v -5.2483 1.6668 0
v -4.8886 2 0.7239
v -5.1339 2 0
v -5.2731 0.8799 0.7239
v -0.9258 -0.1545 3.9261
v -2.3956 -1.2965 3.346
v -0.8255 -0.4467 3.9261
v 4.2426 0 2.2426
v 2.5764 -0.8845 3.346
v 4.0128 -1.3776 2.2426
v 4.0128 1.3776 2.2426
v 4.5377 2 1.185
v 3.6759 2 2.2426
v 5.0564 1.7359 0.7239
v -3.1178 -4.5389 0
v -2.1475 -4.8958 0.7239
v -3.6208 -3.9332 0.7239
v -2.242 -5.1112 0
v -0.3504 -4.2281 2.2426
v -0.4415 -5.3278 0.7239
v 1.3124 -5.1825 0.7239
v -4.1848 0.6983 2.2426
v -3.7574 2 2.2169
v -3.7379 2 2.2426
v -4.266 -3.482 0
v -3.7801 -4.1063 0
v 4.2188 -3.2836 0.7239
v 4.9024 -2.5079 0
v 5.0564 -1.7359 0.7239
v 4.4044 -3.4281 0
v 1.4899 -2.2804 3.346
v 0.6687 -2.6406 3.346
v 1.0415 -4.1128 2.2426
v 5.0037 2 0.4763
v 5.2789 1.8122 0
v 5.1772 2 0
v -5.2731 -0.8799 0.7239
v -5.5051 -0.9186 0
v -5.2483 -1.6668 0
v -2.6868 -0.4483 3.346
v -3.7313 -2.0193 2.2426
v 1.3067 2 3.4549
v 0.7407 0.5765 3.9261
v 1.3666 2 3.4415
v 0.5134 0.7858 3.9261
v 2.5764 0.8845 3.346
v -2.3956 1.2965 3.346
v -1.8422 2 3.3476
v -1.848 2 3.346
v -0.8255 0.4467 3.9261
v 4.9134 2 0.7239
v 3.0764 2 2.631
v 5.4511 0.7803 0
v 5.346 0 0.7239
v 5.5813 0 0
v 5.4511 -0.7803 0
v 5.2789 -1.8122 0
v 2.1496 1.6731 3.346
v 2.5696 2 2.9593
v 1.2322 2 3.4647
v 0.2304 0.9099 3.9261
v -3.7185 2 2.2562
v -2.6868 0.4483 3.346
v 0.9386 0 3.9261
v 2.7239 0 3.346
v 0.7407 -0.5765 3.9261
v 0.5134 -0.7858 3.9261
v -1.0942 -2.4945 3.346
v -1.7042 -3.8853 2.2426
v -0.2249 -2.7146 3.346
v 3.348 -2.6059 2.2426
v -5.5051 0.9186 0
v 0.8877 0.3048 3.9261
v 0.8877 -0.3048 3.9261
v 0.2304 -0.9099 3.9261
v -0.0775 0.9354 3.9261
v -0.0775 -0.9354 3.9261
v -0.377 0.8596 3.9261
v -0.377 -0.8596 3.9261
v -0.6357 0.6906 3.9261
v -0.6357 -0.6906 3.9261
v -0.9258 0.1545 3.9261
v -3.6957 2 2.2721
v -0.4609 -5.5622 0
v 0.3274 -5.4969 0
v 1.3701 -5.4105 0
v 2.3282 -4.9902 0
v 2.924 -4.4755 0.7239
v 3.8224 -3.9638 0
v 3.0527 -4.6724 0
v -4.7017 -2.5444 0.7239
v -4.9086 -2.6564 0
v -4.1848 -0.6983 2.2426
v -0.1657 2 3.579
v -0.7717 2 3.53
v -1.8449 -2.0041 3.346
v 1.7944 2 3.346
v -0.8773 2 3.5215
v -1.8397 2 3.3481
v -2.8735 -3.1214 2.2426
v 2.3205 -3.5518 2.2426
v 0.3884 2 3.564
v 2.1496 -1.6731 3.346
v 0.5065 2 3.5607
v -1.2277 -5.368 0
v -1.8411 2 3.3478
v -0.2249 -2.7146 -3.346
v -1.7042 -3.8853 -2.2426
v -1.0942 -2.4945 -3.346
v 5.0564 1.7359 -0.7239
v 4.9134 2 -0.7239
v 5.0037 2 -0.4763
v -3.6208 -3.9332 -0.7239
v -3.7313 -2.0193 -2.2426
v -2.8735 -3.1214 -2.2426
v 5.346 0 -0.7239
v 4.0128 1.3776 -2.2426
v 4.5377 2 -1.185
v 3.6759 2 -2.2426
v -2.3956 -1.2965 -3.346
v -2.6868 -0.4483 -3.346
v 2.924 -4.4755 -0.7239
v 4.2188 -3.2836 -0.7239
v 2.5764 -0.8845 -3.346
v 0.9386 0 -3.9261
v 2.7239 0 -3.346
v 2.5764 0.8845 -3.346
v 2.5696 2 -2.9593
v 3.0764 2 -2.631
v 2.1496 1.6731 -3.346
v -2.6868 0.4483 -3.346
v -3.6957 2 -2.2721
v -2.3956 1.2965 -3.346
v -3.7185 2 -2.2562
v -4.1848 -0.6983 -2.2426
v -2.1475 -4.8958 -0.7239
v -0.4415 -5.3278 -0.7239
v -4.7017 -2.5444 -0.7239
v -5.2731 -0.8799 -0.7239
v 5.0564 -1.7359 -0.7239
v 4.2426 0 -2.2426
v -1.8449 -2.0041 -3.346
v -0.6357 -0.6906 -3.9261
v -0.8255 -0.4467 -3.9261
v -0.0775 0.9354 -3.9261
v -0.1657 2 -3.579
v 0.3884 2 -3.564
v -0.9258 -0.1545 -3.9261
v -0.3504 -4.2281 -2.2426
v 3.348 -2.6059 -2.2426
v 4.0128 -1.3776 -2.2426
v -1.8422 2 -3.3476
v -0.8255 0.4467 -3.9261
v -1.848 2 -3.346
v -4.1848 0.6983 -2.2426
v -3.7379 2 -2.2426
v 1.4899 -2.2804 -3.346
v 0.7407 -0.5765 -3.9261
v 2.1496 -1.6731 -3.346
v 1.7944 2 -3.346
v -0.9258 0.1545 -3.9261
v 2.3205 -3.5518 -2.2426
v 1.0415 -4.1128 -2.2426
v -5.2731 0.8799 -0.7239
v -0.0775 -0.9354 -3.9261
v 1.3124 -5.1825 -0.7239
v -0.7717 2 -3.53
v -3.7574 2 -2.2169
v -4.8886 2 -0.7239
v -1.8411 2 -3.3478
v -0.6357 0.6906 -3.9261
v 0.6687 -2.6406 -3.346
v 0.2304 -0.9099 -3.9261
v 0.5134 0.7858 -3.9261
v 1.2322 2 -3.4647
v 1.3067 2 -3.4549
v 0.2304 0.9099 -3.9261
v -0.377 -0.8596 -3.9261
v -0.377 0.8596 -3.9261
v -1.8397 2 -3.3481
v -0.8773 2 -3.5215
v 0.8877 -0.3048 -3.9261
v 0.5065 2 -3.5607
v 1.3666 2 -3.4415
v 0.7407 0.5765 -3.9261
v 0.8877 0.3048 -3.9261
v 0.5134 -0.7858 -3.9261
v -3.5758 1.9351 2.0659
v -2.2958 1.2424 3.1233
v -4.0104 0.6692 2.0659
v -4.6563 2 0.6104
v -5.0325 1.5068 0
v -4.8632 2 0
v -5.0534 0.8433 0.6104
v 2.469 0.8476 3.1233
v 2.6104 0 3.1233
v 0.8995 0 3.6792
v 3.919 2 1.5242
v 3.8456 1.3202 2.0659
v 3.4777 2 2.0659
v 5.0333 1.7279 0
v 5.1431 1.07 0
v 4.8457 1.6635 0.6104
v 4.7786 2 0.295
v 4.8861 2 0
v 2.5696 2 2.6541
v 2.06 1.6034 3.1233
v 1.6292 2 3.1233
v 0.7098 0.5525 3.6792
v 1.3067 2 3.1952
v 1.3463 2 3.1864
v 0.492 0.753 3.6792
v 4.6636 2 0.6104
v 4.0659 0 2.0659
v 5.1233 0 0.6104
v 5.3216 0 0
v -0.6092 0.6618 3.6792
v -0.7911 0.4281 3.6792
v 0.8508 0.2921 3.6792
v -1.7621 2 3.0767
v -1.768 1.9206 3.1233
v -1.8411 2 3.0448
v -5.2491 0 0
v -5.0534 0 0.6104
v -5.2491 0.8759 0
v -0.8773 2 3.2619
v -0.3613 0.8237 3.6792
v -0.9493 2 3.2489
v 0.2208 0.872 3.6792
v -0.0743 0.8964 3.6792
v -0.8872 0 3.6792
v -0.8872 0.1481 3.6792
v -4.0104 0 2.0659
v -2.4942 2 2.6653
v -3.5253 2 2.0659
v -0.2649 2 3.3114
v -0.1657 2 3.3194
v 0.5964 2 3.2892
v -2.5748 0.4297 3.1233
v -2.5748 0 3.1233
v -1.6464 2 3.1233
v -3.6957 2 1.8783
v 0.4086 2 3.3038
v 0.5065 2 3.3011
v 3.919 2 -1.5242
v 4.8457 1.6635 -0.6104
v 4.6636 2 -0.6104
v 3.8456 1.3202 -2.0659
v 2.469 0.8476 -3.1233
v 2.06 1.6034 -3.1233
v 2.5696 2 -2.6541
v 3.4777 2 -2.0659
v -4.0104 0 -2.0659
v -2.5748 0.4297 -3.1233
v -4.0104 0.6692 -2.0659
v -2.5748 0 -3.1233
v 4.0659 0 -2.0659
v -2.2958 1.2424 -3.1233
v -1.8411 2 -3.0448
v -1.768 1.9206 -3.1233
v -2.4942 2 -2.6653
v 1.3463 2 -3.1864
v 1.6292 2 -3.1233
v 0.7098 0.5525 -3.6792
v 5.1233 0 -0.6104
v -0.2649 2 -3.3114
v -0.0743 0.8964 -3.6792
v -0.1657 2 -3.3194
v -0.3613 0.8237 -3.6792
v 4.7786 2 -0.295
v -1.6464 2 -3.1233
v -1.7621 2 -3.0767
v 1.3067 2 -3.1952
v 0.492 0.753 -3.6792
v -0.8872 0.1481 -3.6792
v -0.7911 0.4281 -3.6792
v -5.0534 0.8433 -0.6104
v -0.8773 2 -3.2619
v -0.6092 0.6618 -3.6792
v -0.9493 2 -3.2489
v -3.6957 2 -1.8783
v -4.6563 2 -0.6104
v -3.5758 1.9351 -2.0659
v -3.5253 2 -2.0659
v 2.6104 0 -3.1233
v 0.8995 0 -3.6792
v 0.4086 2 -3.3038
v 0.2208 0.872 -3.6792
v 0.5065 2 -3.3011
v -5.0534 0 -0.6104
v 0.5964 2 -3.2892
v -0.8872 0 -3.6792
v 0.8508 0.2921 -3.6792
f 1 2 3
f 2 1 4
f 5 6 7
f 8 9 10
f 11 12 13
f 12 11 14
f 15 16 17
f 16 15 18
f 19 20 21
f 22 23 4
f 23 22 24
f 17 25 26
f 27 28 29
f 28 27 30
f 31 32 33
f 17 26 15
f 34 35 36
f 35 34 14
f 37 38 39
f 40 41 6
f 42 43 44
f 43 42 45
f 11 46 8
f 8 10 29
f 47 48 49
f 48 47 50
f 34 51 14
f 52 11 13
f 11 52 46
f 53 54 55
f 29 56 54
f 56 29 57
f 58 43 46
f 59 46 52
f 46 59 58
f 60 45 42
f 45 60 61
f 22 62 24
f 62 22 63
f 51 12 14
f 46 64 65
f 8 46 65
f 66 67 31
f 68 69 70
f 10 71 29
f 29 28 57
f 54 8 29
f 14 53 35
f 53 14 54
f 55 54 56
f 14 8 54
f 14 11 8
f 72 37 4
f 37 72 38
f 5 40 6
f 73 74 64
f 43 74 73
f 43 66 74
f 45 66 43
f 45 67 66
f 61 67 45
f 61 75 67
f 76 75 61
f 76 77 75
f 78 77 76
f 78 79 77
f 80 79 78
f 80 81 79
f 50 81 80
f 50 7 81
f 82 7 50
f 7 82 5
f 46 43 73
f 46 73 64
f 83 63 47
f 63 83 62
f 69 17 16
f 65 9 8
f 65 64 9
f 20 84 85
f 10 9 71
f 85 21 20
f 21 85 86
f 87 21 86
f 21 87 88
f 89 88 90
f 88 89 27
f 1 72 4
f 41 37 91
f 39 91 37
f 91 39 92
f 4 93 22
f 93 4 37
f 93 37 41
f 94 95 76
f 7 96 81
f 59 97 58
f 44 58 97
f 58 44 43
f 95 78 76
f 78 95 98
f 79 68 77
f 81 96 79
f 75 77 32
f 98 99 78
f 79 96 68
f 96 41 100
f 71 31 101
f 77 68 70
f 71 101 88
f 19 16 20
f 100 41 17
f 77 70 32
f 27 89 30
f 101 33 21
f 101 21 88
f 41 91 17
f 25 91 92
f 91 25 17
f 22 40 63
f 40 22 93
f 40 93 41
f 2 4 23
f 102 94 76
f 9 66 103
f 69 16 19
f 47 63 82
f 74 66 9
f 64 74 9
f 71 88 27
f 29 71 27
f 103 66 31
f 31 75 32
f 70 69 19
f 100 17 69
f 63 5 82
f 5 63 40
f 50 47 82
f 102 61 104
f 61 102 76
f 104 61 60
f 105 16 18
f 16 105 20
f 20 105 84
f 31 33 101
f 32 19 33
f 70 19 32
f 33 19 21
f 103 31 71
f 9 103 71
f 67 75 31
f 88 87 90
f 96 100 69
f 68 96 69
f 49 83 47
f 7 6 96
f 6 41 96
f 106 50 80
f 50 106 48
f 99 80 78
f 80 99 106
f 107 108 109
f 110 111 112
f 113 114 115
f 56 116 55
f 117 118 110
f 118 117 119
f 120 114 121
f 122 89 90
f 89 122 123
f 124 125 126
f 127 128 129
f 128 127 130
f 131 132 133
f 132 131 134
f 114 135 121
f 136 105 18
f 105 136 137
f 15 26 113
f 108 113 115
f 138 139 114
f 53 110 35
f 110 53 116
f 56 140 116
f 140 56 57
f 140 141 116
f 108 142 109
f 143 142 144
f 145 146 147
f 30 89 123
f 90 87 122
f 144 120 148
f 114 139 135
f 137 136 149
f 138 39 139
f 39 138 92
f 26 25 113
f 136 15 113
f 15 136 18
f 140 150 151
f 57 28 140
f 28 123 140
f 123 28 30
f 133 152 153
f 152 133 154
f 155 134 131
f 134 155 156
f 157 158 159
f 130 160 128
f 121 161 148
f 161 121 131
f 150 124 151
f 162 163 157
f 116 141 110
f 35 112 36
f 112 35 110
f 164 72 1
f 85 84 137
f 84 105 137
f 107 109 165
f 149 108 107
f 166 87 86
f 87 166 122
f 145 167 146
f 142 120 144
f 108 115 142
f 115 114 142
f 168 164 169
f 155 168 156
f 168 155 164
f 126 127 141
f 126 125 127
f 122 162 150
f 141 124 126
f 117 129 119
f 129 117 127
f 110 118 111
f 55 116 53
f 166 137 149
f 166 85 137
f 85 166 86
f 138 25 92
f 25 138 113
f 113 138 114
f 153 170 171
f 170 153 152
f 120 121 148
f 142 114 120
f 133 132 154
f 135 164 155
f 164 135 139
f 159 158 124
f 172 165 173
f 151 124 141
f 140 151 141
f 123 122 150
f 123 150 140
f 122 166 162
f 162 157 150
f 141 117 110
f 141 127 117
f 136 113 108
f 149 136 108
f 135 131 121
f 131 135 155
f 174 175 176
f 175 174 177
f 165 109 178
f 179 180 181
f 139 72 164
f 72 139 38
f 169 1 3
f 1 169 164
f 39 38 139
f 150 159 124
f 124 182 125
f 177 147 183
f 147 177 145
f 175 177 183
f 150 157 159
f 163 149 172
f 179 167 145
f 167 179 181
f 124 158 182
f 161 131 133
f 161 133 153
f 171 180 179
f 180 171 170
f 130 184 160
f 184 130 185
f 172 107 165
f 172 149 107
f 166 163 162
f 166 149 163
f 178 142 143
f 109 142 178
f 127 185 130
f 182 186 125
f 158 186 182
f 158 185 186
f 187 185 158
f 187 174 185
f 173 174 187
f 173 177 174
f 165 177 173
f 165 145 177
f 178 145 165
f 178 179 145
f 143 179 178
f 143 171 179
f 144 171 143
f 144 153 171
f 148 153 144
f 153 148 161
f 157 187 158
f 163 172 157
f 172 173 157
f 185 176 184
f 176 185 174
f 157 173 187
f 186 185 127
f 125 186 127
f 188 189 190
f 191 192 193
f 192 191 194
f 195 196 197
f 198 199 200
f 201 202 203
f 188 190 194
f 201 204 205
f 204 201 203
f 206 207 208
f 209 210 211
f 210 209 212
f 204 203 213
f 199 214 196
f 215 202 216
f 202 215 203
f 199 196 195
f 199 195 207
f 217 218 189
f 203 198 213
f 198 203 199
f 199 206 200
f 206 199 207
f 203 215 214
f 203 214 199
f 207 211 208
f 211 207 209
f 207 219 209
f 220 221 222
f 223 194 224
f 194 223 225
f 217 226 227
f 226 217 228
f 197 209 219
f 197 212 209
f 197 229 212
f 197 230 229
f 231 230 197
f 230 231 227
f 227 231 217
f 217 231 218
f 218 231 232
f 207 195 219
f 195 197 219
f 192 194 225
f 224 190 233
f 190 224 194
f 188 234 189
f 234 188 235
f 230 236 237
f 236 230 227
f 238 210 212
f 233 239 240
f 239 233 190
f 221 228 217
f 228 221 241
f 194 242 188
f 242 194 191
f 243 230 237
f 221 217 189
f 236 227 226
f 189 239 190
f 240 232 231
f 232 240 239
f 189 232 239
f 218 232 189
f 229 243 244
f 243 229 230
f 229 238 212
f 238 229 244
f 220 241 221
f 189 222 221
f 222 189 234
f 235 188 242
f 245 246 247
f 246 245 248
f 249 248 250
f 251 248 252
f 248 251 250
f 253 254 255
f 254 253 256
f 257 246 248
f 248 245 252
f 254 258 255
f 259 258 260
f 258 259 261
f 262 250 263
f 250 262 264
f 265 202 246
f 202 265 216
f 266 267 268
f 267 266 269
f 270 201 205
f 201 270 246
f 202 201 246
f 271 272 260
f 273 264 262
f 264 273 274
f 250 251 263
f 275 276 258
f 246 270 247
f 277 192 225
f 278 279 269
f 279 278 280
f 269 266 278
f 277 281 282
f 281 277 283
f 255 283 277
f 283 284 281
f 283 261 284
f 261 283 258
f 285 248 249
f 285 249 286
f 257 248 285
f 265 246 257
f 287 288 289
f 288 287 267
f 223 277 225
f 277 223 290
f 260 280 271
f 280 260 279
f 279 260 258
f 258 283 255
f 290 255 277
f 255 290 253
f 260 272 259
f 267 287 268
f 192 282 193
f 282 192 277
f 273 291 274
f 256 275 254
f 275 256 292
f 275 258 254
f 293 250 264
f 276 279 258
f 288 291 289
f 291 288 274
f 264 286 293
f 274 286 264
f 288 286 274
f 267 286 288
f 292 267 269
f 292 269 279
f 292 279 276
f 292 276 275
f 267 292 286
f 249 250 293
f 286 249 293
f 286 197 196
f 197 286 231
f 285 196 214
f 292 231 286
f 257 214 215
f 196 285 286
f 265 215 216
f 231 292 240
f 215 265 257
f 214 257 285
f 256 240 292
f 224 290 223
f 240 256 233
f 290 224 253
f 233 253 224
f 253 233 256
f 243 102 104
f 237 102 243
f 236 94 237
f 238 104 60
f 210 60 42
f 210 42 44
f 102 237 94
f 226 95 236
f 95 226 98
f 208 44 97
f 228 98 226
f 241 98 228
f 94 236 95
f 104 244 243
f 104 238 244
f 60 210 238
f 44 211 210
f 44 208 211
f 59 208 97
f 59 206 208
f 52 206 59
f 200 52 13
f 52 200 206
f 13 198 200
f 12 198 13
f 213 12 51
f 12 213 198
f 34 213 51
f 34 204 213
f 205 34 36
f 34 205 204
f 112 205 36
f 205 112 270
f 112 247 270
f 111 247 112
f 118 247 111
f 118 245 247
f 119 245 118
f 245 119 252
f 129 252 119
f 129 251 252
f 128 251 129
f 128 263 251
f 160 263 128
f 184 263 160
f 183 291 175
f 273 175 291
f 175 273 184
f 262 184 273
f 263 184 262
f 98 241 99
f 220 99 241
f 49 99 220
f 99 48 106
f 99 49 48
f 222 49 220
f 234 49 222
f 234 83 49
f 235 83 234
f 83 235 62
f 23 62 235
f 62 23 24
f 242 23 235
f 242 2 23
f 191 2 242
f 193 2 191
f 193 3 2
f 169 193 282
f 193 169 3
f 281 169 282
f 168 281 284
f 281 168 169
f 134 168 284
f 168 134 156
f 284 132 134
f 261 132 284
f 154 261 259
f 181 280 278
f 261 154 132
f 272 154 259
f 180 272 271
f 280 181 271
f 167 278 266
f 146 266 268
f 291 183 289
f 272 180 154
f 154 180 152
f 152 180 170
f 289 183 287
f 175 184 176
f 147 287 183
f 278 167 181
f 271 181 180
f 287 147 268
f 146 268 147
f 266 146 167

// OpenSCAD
//
//
//


module boat_hull(hull_length, hull_width, hull_thickness, hull_wall_height) {
    hull_half_length = hull_length / 2.0;
    hull_half_width = hull_width / 2.0;
    hull_half_diff = hull_half_length - hull_half_width;
    H = hull_length * 2.0;
    L = -H;

    // boat-hull
    difference() {
        // full-hull
        difference() {
            // outer-hull
            intersection() {
                translate([0, 0, -hull_half_diff]) { sphere(hull_half_length); }
                translate([0, 0, hull_half_diff]) { sphere(hull_half_length); }
            }

            // inner-floor
            intersection() {
                // inner-hull-space
                intersection() {
                    translate([0, 0, - hull_half_diff]) { sphere(hull_half_length - hull_thickness); }
                    translate([0, 0, hull_half_diff]) { sphere(hull_half_length - hull_thickness); }
                }
                translate([L, 0, L]) { cube([H - L, H, H - L], false); }
            }
        }

        translate([L, hull_wall_height, L]) { cube([H - L, H - hull_wall_height, H - L], false); }
    }
}


hull_length = 12;
hull_width = 8;
hull_thickness = 0.25;
hull_wall_height = 2;
only_output_rail = 0;
H = hull_length * 2.0;
L = -H;


if (only_output_rail) {
    intersection() {
        boat_hull(hull_length, hull_width, hull_thickness, hull_wall_height);
        translate([L, 0, L]) { cube([H - L, H - 0, H - L], false); }
    }
} else {
    boat_hull(hull_length, hull_width, hull_thickness, hull_wall_height);
}
